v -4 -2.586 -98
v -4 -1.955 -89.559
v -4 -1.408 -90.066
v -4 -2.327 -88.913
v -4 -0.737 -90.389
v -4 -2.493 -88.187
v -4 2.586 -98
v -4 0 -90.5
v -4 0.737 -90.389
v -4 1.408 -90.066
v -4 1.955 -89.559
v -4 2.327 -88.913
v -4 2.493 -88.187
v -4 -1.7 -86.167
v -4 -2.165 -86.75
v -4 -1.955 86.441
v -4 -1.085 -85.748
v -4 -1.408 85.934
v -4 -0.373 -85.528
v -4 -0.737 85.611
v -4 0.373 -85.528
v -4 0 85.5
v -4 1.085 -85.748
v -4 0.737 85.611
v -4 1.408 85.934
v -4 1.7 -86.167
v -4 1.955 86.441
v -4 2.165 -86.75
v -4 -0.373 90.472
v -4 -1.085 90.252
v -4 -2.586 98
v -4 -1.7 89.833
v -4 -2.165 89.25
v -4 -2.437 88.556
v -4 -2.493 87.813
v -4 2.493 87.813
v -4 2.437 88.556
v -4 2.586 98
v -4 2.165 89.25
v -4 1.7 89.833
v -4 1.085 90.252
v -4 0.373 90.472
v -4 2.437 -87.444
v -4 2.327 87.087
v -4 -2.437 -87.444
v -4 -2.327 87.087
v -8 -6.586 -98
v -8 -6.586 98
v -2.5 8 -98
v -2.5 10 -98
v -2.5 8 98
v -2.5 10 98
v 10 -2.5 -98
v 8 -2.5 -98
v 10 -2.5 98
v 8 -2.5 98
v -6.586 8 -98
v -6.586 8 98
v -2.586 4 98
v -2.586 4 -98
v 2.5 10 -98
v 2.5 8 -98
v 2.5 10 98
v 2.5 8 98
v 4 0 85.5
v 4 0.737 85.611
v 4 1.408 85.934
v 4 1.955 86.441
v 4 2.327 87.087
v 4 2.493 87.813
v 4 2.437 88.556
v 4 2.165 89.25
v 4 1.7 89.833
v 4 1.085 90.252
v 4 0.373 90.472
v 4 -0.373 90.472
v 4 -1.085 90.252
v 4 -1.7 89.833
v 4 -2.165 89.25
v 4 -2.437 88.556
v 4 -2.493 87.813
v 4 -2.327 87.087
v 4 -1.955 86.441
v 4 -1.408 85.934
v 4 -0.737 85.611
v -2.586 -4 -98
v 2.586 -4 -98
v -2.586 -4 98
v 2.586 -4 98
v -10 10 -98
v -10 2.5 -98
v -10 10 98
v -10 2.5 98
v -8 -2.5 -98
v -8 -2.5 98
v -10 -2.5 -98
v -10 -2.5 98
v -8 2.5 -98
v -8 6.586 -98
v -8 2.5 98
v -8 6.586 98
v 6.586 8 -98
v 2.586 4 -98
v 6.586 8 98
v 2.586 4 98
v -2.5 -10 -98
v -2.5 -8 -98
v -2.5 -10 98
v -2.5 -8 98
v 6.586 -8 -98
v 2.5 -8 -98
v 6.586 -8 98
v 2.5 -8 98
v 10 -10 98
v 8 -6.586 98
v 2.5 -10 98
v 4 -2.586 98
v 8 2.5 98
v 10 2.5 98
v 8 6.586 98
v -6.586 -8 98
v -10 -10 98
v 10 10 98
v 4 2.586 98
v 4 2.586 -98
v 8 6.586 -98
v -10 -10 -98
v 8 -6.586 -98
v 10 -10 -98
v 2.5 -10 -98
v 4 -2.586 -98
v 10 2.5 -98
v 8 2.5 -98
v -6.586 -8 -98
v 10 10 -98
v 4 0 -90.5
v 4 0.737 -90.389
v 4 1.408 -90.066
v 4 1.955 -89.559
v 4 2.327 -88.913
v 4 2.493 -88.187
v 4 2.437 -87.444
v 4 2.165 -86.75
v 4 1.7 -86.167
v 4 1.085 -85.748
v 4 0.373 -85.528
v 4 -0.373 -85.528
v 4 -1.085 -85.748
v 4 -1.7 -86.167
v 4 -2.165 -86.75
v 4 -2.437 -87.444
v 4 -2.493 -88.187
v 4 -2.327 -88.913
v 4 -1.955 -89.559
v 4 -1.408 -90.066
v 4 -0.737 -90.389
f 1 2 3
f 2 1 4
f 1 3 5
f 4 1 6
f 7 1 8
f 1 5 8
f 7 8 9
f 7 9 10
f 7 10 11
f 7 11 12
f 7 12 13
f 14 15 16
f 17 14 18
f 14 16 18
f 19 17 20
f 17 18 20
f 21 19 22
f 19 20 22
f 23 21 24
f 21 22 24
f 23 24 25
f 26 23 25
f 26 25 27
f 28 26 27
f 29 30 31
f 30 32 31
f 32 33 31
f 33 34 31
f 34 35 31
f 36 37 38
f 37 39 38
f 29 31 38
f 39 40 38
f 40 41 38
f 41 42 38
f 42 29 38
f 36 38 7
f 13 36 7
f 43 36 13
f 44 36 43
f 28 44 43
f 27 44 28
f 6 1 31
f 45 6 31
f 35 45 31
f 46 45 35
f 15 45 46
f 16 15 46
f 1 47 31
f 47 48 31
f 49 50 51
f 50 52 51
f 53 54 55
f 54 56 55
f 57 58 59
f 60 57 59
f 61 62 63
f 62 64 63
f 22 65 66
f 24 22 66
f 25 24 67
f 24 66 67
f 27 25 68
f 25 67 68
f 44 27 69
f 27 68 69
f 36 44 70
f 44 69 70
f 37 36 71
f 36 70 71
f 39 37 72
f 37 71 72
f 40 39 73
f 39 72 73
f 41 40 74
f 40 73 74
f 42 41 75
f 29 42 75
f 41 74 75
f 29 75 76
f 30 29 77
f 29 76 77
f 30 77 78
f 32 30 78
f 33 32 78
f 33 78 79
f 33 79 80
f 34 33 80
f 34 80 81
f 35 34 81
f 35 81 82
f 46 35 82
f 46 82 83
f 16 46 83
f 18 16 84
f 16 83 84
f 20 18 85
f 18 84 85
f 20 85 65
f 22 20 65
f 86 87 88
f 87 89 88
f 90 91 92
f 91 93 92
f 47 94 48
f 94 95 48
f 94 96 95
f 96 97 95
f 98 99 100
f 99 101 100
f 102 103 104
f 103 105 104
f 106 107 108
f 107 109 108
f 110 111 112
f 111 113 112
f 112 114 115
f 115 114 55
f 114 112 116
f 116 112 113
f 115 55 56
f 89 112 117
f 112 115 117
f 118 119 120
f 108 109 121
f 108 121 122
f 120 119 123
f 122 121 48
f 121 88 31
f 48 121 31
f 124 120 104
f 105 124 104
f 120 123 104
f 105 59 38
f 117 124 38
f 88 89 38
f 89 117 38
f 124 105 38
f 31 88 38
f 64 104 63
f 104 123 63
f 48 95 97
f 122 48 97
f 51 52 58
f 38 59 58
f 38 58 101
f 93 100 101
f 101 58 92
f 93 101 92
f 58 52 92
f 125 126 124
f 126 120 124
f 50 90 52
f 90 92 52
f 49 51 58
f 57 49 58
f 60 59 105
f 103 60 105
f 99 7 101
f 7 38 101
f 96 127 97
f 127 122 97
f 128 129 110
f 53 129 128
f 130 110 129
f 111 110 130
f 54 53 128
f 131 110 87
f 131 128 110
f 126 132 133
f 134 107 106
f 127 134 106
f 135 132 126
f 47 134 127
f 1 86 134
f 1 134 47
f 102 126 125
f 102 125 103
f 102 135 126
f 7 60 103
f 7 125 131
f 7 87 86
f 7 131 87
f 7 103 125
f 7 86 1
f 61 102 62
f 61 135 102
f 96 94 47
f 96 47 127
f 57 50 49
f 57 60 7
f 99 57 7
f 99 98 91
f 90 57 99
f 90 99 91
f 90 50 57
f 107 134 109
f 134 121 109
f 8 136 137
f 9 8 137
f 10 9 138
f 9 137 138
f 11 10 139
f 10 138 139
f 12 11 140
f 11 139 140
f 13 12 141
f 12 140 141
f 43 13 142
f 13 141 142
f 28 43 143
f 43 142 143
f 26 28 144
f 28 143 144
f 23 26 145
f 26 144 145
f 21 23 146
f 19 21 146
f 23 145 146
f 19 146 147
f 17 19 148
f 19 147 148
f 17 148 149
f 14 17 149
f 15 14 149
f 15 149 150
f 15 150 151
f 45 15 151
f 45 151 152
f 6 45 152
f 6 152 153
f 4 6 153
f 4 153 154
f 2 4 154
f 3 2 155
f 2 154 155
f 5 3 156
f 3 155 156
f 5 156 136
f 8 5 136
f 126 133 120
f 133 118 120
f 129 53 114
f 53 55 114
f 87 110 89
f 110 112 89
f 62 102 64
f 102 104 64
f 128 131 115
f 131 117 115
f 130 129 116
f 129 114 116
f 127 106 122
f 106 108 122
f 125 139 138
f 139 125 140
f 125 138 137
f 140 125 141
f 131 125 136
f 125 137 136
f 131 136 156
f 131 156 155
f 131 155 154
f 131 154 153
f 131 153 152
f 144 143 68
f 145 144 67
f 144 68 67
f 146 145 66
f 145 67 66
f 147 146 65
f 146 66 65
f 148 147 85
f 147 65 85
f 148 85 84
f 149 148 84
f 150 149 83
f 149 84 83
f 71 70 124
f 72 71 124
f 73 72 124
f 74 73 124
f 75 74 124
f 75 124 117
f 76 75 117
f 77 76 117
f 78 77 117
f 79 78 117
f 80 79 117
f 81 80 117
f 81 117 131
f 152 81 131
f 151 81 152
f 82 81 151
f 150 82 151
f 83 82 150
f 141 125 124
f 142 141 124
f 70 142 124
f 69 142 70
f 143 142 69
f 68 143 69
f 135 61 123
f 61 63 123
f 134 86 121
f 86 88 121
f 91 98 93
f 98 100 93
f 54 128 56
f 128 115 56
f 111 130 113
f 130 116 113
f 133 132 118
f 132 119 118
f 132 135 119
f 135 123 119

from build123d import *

# Parameters (mm, degrees)
BOSS_EXTRUDE1_DEPTH = 98
SKETCH2_R           = 2.5
CUT_EXTRUDE1_DEPTH  = 8


with BuildPart() as part:
    # Sketch1 → Boss-Extrude1 (new body, symmetric)
    with BuildSketch(Plane.XY):
        Polygon((-2.585786438, 4), (2.585786438, 4), (6.585786438, 8), (2.5, 8), (2.5, 10), (10, 10), (10, 2.5), (8, 2.5), (8, 6.585786438), (4, 2.585786438), (4, -2.585786438), (8, -6.585786438), (8, -2.5), (10, -2.5), (10, -10), (2.5, -10), (2.5, -8), (6.585786438, -8), (2.585786438, -4), (-2.585786438, -4), (-6.585786438, -8), (-2.5, -8), (-2.5, -10), (-10, -10), (-10, -2.5), (-8, -2.5), (-8, -6.585786438), (-4, -2.585786438), (-4, 2.585786438), (-8, 6.585786438), (-8, 2.5), (-10, 2.5), (-10, 10), (-2.5, 10), (-2.5, 8), (-6.585786438, 8), align=None)
    extrude(amount=BOSS_EXTRUDE1_DEPTH, both=True)

    # Sketch2 → Cut-Extrude1 (cut)
    with BuildSketch(Plane(origin=(4, 0, 0), x_dir=(0, 0, -1), z_dir=(1, 0, 0))):
        with Locations((88, 0)):
            Circle(SKETCH2_R)
        with Locations((-88, 0)):
            Circle(SKETCH2_R)
    extrude(amount=-CUT_EXTRUDE1_DEPTH, mode=Mode.SUBTRACT)


solid = part.part
